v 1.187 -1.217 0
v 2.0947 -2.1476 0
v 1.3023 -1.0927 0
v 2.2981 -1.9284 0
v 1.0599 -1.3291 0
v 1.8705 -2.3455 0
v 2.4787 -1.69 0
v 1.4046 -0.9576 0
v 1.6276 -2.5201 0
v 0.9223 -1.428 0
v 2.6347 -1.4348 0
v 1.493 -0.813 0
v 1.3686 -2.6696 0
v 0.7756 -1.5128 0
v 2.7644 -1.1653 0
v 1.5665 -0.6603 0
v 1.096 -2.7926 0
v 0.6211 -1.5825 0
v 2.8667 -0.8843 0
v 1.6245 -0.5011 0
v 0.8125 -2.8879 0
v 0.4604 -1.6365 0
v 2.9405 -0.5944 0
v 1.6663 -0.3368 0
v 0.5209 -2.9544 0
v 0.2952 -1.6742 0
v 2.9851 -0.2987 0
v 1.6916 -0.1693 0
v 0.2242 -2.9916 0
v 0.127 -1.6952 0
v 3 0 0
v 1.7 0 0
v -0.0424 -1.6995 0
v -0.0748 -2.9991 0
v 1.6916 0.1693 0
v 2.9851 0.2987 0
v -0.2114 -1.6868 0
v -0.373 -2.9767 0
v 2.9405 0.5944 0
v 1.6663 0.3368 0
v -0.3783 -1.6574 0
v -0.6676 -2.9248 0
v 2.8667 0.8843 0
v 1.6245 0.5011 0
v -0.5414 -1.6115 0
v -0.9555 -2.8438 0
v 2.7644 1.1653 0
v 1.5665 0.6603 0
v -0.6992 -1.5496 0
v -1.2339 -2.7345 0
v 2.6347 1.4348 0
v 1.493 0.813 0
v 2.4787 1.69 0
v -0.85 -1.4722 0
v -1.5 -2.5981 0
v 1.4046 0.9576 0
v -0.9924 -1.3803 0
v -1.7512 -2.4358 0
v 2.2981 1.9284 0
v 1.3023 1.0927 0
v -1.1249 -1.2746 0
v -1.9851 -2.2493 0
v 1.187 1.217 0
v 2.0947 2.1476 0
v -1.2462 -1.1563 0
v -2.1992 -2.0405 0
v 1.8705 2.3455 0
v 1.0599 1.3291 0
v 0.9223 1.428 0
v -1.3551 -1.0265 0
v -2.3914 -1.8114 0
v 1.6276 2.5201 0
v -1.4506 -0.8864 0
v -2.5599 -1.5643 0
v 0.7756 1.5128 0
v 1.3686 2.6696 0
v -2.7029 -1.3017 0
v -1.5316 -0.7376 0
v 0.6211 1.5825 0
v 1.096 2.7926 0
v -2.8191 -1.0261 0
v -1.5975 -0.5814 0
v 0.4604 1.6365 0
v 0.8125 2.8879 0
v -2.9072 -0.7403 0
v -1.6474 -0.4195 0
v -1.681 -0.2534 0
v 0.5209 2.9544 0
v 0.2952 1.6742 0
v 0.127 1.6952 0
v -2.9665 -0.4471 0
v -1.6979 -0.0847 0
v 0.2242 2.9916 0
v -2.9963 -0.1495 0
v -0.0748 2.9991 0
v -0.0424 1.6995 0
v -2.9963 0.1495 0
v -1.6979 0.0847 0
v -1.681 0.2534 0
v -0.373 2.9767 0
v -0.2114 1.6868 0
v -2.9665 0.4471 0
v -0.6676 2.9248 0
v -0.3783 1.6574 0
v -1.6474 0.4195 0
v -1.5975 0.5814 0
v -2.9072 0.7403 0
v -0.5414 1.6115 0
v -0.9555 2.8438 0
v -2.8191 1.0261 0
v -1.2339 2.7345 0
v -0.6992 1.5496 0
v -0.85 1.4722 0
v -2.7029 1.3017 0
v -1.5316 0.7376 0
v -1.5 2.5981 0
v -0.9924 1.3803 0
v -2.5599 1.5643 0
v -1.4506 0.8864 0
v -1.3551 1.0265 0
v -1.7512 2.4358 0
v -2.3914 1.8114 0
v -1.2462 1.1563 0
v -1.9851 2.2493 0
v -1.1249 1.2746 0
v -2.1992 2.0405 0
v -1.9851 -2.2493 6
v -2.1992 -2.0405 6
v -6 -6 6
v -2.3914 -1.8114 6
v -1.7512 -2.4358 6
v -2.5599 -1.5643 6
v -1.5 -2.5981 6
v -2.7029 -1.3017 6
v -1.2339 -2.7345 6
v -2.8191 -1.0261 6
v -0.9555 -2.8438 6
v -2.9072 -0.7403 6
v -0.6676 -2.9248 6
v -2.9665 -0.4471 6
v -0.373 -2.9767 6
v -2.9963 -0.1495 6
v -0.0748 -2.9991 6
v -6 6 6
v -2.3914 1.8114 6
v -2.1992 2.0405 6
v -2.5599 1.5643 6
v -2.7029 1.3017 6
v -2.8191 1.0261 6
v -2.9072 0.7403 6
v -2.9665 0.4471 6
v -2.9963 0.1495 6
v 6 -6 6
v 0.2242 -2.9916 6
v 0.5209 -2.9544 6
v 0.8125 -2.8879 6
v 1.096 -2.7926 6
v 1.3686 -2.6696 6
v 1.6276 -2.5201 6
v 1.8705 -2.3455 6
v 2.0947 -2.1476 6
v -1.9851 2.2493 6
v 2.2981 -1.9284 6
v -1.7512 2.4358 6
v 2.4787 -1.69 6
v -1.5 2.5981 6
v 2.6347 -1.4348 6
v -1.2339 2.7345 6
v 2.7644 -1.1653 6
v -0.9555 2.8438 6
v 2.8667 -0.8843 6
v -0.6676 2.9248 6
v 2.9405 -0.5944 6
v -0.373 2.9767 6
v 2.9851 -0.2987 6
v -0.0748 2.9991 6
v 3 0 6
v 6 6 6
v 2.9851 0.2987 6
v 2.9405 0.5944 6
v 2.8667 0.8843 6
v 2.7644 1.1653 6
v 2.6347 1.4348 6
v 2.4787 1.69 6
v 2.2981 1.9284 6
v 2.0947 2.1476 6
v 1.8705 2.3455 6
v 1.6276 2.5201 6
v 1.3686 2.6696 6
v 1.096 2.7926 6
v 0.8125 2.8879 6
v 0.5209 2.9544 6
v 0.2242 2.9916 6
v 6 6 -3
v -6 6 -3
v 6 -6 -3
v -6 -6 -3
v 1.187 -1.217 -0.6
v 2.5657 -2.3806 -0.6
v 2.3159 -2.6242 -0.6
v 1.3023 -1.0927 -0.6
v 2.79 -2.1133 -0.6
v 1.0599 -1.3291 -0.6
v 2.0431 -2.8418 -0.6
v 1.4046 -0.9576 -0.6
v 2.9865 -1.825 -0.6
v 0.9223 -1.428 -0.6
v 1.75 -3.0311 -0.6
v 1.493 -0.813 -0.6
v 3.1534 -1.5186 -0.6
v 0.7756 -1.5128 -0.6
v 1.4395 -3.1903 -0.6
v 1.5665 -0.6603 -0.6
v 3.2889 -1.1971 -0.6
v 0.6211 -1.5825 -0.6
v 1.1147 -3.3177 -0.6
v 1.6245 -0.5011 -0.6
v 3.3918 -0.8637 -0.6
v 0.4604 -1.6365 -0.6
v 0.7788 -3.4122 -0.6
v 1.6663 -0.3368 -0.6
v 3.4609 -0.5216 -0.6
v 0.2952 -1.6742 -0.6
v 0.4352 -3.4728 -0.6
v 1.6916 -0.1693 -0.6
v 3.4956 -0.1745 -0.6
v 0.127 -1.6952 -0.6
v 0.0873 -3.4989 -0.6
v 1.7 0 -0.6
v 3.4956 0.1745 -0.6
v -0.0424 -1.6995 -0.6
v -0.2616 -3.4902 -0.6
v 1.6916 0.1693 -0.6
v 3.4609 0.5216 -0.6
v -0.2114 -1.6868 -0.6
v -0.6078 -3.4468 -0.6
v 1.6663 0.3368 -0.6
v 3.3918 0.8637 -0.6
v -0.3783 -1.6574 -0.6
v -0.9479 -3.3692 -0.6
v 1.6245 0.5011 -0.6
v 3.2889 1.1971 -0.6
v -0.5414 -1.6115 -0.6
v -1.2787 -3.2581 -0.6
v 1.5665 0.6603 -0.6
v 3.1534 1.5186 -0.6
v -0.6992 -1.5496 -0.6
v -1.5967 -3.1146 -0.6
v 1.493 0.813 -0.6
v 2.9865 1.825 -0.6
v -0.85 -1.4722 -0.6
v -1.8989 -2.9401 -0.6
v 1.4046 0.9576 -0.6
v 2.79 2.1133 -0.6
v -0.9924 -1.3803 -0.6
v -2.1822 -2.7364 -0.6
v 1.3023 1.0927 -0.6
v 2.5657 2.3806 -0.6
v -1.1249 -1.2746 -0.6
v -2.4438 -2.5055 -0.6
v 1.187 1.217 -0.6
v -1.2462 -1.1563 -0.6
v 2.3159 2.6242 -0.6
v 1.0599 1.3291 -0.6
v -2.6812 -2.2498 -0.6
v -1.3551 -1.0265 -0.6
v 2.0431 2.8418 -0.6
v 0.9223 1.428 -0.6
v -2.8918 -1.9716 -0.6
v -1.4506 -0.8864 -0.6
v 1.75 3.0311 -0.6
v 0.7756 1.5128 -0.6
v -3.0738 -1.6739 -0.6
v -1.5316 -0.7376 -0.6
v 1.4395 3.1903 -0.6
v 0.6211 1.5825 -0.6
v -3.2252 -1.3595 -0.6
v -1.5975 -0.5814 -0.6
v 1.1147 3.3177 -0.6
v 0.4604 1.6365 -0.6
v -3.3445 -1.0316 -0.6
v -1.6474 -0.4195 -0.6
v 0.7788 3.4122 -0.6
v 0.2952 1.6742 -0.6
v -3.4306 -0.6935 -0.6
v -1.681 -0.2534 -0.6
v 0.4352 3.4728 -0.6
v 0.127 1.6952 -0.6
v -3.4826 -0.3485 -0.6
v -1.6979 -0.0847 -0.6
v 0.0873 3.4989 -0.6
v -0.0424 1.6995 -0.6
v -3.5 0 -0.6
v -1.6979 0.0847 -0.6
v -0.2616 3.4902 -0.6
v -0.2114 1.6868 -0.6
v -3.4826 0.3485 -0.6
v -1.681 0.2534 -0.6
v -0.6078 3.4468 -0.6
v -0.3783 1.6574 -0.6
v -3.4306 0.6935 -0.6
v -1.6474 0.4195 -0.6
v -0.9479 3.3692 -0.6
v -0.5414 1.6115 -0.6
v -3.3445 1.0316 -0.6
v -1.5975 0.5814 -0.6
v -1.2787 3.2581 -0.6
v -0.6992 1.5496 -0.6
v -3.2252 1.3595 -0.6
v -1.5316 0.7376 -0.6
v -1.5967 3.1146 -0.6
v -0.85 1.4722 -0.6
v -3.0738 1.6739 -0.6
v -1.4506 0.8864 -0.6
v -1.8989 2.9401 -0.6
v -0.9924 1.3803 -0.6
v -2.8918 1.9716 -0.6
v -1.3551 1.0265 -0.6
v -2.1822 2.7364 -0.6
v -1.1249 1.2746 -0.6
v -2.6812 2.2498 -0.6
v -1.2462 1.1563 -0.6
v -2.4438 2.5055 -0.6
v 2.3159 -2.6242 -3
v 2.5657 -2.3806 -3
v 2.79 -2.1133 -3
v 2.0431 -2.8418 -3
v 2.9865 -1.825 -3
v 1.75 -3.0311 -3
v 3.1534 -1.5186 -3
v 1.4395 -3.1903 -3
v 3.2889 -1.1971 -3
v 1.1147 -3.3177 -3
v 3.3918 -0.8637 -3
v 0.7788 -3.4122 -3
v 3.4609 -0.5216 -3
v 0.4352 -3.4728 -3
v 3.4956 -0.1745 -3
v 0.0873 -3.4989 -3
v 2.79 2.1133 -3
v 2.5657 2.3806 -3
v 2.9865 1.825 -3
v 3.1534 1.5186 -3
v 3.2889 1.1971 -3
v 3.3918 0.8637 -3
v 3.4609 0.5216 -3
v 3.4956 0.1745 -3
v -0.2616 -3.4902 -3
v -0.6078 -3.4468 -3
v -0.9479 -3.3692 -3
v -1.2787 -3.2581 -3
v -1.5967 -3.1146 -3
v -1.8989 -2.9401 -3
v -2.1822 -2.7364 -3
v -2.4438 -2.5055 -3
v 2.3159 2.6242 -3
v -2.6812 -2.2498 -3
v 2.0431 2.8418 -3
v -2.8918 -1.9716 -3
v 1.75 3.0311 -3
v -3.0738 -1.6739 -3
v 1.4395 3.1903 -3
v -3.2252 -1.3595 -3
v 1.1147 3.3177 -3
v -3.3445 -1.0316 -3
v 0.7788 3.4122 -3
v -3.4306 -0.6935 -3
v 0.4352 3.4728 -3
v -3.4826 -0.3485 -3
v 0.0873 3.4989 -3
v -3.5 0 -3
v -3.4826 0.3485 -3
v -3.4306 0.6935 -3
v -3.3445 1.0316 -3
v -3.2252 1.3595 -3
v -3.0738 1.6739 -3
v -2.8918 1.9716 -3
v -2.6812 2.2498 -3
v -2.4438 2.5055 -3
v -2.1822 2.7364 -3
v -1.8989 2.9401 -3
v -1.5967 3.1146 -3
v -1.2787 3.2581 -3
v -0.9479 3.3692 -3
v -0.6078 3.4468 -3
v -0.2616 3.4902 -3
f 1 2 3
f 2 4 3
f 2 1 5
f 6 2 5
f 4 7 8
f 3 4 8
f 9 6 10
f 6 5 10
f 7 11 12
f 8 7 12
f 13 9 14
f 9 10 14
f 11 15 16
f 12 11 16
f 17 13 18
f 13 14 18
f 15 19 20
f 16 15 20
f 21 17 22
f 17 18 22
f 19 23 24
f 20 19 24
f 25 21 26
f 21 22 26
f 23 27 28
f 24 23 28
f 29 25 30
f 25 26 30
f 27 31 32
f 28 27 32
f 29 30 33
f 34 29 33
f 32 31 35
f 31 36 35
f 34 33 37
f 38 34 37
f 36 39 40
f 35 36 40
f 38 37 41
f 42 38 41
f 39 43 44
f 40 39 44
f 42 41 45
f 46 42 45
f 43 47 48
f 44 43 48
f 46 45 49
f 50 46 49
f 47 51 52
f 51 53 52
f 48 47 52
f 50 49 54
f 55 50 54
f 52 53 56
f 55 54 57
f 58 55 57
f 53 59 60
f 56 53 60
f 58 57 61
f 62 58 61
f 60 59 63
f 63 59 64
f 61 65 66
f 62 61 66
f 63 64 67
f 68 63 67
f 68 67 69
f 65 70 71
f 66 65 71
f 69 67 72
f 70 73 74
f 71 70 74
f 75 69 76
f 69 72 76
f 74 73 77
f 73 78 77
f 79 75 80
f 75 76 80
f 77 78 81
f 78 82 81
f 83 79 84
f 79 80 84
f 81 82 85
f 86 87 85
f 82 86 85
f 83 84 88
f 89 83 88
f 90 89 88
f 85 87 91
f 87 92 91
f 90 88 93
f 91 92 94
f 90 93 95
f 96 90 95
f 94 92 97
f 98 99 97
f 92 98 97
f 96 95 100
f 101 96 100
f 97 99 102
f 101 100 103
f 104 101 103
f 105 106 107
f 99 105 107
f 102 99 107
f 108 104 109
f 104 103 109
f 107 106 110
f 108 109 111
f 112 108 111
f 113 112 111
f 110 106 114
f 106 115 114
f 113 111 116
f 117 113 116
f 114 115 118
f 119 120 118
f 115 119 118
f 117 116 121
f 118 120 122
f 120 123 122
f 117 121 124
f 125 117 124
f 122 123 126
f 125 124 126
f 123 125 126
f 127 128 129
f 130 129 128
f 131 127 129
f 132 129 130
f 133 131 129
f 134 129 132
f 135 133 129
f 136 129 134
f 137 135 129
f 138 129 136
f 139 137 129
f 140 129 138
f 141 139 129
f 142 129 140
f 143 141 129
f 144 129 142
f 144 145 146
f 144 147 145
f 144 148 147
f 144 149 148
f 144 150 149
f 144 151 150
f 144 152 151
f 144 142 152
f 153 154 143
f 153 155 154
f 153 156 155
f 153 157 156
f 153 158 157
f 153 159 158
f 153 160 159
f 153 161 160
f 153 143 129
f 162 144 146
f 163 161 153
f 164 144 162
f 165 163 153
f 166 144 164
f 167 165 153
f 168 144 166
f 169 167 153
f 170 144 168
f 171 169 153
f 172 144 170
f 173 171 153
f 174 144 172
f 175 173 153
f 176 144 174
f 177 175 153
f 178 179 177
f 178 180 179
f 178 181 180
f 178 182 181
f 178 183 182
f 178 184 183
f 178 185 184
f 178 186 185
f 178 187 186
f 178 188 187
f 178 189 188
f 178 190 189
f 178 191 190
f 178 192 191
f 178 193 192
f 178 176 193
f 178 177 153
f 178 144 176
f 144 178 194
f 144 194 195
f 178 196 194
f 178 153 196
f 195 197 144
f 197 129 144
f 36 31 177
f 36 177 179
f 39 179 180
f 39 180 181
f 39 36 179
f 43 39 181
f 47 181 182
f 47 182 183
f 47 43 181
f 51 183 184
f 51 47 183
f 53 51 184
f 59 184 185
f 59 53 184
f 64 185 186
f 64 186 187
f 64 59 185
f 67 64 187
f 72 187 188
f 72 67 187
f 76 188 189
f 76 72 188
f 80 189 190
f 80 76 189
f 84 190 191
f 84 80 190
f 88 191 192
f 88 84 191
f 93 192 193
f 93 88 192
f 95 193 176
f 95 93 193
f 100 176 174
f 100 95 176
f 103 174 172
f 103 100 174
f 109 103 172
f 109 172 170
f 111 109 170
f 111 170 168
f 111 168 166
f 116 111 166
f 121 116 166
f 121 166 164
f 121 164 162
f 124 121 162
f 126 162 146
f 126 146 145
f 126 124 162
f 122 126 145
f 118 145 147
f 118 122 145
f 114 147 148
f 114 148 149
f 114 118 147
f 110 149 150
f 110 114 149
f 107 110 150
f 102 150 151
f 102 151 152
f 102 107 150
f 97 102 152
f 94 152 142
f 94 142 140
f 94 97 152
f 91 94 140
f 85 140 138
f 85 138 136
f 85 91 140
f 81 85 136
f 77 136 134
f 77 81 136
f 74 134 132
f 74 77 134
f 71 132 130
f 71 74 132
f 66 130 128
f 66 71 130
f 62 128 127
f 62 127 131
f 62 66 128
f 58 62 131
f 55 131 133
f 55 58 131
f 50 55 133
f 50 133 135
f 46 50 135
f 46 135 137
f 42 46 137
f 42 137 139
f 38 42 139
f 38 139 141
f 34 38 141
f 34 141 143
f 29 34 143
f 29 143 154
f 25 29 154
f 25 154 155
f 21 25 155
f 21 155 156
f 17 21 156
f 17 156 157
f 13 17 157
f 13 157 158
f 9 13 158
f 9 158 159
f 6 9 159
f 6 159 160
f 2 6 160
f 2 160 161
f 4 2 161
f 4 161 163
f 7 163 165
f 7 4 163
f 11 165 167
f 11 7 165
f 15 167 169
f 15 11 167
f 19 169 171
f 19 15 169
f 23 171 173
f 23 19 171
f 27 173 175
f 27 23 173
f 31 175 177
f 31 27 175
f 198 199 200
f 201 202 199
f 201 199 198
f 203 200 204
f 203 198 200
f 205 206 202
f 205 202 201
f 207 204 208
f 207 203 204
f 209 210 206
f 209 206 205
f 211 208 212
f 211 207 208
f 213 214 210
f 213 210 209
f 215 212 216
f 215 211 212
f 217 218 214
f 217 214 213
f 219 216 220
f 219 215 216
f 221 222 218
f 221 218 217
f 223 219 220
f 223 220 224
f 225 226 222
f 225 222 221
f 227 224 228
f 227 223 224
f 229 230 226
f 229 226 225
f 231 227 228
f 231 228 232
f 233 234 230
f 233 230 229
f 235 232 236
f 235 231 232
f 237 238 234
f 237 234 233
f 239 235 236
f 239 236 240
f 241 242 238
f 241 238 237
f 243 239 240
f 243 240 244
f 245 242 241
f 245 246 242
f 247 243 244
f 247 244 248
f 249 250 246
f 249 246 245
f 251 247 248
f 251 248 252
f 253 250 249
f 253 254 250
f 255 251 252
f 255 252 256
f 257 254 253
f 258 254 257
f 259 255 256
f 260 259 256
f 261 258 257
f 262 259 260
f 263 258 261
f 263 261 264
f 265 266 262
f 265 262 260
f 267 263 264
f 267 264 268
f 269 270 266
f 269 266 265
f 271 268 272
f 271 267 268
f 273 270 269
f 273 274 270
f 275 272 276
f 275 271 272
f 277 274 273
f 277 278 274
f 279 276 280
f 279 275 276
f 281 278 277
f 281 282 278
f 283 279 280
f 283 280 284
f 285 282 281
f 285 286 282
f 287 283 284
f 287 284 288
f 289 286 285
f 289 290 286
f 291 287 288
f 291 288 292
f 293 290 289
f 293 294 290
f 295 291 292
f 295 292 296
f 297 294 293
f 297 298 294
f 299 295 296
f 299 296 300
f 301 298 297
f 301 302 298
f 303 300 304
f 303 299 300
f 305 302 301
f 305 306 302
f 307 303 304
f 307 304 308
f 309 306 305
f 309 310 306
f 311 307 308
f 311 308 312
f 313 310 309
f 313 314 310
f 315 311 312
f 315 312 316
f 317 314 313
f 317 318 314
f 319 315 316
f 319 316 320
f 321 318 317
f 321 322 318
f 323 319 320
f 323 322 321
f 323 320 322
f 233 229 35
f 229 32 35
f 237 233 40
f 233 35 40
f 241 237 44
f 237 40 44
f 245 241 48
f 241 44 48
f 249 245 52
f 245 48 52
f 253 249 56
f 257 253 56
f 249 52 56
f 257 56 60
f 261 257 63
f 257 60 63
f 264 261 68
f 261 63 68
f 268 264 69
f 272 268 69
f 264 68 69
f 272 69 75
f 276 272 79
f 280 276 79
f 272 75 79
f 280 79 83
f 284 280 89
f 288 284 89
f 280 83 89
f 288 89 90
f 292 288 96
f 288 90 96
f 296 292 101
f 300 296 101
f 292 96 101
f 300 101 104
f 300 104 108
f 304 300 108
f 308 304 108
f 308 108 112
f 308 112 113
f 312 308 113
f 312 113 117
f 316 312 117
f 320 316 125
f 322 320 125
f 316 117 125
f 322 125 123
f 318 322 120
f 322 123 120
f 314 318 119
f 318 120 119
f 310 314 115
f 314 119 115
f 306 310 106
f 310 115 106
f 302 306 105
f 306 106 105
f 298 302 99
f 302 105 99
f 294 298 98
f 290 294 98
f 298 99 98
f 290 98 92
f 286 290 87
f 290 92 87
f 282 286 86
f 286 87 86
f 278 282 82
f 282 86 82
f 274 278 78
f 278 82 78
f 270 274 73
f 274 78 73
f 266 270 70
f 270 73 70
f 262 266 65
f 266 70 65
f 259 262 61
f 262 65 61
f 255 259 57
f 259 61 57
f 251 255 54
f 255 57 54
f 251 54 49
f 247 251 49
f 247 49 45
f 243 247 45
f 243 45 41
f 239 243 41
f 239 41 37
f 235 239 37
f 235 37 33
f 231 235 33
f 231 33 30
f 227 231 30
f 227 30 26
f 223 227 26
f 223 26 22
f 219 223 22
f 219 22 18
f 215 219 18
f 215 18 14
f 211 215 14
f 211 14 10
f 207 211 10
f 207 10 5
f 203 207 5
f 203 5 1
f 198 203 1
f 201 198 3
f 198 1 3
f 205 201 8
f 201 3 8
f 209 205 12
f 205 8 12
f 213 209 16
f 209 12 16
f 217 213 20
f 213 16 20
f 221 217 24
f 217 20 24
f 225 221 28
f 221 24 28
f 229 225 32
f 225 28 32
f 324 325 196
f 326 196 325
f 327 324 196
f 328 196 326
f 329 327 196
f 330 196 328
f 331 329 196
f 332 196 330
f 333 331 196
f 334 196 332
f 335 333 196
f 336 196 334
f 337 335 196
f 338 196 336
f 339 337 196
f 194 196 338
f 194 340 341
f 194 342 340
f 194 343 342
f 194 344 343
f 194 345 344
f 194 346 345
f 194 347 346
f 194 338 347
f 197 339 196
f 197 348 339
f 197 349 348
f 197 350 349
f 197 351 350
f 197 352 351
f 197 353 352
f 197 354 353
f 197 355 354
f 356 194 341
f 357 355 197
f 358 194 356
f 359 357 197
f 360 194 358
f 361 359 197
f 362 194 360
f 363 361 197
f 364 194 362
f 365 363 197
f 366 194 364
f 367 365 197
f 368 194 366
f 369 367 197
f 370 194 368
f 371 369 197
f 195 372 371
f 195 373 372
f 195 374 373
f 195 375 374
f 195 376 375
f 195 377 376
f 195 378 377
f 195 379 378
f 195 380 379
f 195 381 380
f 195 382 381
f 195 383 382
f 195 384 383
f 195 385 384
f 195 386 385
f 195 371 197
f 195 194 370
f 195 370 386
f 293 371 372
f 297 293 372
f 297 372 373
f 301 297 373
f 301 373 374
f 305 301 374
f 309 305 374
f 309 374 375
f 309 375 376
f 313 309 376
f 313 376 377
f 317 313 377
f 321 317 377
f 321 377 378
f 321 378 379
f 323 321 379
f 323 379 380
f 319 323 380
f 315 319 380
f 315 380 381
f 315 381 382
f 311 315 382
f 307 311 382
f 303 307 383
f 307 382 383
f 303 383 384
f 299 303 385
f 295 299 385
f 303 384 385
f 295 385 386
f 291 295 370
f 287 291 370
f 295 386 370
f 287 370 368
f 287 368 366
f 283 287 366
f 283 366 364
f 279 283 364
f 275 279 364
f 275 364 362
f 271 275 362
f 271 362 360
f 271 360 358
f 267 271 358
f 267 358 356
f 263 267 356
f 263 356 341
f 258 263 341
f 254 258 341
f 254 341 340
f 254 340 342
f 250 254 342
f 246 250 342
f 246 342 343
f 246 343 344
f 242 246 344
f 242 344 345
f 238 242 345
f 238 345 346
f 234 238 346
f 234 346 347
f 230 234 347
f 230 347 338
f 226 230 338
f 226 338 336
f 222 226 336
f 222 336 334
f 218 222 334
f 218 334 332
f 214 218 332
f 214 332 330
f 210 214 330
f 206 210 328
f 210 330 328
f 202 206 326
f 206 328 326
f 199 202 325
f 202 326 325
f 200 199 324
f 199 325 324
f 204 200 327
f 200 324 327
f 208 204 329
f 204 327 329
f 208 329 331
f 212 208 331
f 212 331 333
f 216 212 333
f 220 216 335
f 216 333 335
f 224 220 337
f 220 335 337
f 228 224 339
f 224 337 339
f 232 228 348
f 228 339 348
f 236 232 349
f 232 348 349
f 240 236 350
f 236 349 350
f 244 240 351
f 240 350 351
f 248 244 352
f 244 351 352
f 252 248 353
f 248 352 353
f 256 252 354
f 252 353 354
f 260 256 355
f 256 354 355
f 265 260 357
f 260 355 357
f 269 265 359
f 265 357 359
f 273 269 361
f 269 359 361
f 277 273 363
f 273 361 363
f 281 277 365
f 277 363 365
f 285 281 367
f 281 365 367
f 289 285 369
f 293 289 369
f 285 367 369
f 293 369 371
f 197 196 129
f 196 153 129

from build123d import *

# Parameters (mm, degrees)
ESQUISSE1_W                                        = 12
ESQUISSE1_H                                        = 12
ESQUISSE1_R                                        = 3
BOSS_EXTRU_1_DEPTH                                 = 6
ESQUISSE2_W                                        = 12
ESQUISSE2_H                                        = 12
BOSS_EXTRU_2_DEPTH                                 = 3
CHAMBRAGE_POUR_VIS_T_TE_RONDE_BOMB_E_M_D           = 3.4
CHAMBRAGE_POUR_VIS_T_TE_RONDE_BOMB_E_M_DEPTH       = 6.35
CHAMBRAGE_POUR_VIS_T_TE_RONDE_BOMB_E_M_CBORE_D     = 7
CHAMBRAGE_POUR_VIS_T_TE_RONDE_BOMB_E_M_CBORE_DEPTH = 2.4


with BuildPart() as part:
    # Esquisse1 → Boss.-Extru.1 (new body)
    with BuildSketch(Plane.XY):
        Rectangle(ESQUISSE1_W, ESQUISSE1_H)
        Circle(ESQUISSE1_R, mode=Mode.SUBTRACT)
    extrude(amount=BOSS_EXTRU_1_DEPTH)

    # Esquisse2 → Boss.-Extru.2 (add)
    with BuildSketch(Plane(origin=(0, 0, 0), x_dir=(-1, 0, 0), z_dir=(0, 0, -1))):
        Rectangle(ESQUISSE2_W, ESQUISSE2_H)
    extrude(amount=BOSS_EXTRU_2_DEPTH)

    # Chambrage pour vis à tête ronde bombée M31
    with Locations(Plane(origin=(0, 0, -3), x_dir=(-1, 0, 0), z_dir=(0, 0, -1))):
        with Locations((0, 0)):
            CounterBoreHole(CHAMBRAGE_POUR_VIS_T_TE_RONDE_BOMB_E_M_D / 2, CHAMBRAGE_POUR_VIS_T_TE_RONDE_BOMB_E_M_CBORE_D / 2, CHAMBRAGE_POUR_VIS_T_TE_RONDE_BOMB_E_M_CBORE_DEPTH, depth=CHAMBRAGE_POUR_VIS_T_TE_RONDE_BOMB_E_M_DEPTH)


solid = part.part
